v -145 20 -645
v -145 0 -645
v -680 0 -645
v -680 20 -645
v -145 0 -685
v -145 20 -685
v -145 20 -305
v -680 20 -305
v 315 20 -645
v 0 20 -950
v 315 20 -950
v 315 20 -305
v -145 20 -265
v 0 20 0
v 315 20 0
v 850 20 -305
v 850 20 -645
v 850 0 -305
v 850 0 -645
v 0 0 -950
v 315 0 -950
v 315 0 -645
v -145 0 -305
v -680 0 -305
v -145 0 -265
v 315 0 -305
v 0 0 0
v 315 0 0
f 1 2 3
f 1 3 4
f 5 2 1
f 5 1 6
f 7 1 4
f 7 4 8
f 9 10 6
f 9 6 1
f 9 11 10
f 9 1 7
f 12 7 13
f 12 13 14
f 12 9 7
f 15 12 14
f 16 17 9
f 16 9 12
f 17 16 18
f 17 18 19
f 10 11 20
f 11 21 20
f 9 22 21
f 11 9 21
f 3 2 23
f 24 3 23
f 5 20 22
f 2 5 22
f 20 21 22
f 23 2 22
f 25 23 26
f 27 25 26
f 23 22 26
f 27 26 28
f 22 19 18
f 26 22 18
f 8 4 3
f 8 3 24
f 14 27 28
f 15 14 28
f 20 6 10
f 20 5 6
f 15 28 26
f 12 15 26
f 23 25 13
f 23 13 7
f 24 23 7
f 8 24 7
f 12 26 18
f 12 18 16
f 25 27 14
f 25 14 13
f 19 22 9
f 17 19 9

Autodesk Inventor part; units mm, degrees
ref_plane "YZ Plane" through (0, 0, 0) normal (1, 0, 0) x (0, 1, 0)
ref_plane "XZ Plane" through (0, 0, 0) normal (0, 1, 0) x (-1, 0, 0)
ref_plane "XY Plane" through (0, 0, 0) normal (0, 0, 1) x (1, 0, 0)
sketch "스케치1" plane through (0, 0, 0) normal (0, 1, 0) x (-1, 0, 0)
  line L0 (0, 0) -> (-315, 0)
  line L1 (-315, 0) -> (-315, -950)
  line L2 (-315, -950) -> (0, -950)
  line L3 (0, -950) -> (0, 0)
  line L4 (-315, -645) -> (-315, -475)
  line L5 (-315, -475) -> (-535, -475)
  line L6 (-535, -475) -> (-535, -645)
  line L7 (-535, -645) -> (-315, -645)
  line L8 (-315, -645) -> (-315, -475)
  line L9 (-315, -475) -> (-535, -475)
  line L10 (-315, -305) -> (-315, -475)
  line L11 (-315, -475) -> (-535, -475)
  line L12 (-535, -475) -> (-535, -305)
  line L13 (-535, -305) -> (-315, -305)
  line L14 (-315, -305) -> (-315, -475)
  line L15 (0, -305) -> (0, 0)
  line L16 (0, -645) -> (0, -950)
  line L17 (0, 0) -> (175, 0)
  line L18 (175, 0) -> (175, -950)
  line L19 (175, -950) -> (0, -950)
  line L20 (0, -950) -> (0, 0)
  line L21 (175, 0) -> (145, 0)
  line L22 (145, 0) -> (145, -950)
  line L23 (145, -950) -> (175, -950)
  line L24 (175, -950) -> (175, 0)
  line L25 (175, -475) -> (145, -475)
  line L26 (145, -475) -> (145, -645)
  line L27 (145, -645) -> (175, -645)
  line L28 (175, -645) -> (175, -475)
  line L29 (175, -475) -> (145, -475)
  line L30 (145, -475) -> (145, -305)
  line L31 (145, -305) -> (175, -305)
  line L32 (175, -305) -> (175, -475)
  line L33 (145, -645) -> (-315, -645)
  line L34 (-315, -645) -> (-315, -685)
  line L35 (-315, -685) -> (145, -685)
  line L36 (145, -685) -> (145, -645)
  line L37 (145, -305) -> (-315, -305)
  line L38 (-315, -305) -> (-315, -265)
  line L39 (-315, -265) -> (145, -265)
  line L40 (145, -265) -> (145, -305)
  line L41 (0, 0) -> (145, -265)
  line L42 (145, -685) -> (0, -950)
  dimension "d0" = 315
  dimension "d1" = 950
  dimension "d3" = 220
  dimension "d4" = 170
  dimension "d5" = 220
  dimension "d6" = 170
  dimension "d7" = 175
  dimension "d8" = 30
  dimension "d9" = 460
  dimension "d10" = 40
  dimension "d11" = 460
  dimension "d12" = 40
extrude "돌출1" add sketch "스케치1" along normal blind 20 contours L3 L39 L1 L0 | L41 L39 L3 | L39 L22 L37 L3 | L3 L37 L1 L39 | L37 L22 L33 L3 | L3 L33 L1 L37 | L31 L18 L25 L22 | L1 L5 L12 L13 | L33 L22 L35 L3 | L3 L35 L1 L33 | L25 L18 L27 L22 | L1 L7 L6 L5 | L35 L42 L3 | L3 L2 L1 L35
sketch "스케치2" plane through (535, 0, -305) normal (1, 0, 0) x (0, 0, -1)
  line L0 (0, 0) -> (340, 0) projected
  line L1 (340, 0) -> (340, 20) projected
  line L2 (0, 20) -> (340, 20) projected
  line L3 (0, 0) -> (0, 20) projected
  line L4 (0, 20) -> (340, 20)
  line L5 (340, 20) -> (340, 0)
  line L6 (340, 0) -> (0, 0)
  line L7 (0, 0) -> (0, 20)
  point P0 (-305, 0)
extrude "돌출2" add sketch "스케치2" along normal blind 315
sketch "스케치3" plane through (-175, 0, -645) normal (-1, 0, 0) x (0, 0, 1)
  line L0 (0, 0) -> (340, 0) projected
  line L1 (340, 0) -> (340, 20) projected
  line L2 (0, 20) -> (340, 20) projected
  line L3 (0, 0) -> (0, 20) projected
  line L4 (0, 20) -> (340, 20)
  line L5 (340, 20) -> (340, 0)
  line L6 (340, 0) -> (0, 0)
  line L7 (0, 0) -> (0, 20)
  point P0 (645, 0)
extrude "돌출3" add sketch "스케치3" along normal blind 505
properties part number "cover" material "고무"
